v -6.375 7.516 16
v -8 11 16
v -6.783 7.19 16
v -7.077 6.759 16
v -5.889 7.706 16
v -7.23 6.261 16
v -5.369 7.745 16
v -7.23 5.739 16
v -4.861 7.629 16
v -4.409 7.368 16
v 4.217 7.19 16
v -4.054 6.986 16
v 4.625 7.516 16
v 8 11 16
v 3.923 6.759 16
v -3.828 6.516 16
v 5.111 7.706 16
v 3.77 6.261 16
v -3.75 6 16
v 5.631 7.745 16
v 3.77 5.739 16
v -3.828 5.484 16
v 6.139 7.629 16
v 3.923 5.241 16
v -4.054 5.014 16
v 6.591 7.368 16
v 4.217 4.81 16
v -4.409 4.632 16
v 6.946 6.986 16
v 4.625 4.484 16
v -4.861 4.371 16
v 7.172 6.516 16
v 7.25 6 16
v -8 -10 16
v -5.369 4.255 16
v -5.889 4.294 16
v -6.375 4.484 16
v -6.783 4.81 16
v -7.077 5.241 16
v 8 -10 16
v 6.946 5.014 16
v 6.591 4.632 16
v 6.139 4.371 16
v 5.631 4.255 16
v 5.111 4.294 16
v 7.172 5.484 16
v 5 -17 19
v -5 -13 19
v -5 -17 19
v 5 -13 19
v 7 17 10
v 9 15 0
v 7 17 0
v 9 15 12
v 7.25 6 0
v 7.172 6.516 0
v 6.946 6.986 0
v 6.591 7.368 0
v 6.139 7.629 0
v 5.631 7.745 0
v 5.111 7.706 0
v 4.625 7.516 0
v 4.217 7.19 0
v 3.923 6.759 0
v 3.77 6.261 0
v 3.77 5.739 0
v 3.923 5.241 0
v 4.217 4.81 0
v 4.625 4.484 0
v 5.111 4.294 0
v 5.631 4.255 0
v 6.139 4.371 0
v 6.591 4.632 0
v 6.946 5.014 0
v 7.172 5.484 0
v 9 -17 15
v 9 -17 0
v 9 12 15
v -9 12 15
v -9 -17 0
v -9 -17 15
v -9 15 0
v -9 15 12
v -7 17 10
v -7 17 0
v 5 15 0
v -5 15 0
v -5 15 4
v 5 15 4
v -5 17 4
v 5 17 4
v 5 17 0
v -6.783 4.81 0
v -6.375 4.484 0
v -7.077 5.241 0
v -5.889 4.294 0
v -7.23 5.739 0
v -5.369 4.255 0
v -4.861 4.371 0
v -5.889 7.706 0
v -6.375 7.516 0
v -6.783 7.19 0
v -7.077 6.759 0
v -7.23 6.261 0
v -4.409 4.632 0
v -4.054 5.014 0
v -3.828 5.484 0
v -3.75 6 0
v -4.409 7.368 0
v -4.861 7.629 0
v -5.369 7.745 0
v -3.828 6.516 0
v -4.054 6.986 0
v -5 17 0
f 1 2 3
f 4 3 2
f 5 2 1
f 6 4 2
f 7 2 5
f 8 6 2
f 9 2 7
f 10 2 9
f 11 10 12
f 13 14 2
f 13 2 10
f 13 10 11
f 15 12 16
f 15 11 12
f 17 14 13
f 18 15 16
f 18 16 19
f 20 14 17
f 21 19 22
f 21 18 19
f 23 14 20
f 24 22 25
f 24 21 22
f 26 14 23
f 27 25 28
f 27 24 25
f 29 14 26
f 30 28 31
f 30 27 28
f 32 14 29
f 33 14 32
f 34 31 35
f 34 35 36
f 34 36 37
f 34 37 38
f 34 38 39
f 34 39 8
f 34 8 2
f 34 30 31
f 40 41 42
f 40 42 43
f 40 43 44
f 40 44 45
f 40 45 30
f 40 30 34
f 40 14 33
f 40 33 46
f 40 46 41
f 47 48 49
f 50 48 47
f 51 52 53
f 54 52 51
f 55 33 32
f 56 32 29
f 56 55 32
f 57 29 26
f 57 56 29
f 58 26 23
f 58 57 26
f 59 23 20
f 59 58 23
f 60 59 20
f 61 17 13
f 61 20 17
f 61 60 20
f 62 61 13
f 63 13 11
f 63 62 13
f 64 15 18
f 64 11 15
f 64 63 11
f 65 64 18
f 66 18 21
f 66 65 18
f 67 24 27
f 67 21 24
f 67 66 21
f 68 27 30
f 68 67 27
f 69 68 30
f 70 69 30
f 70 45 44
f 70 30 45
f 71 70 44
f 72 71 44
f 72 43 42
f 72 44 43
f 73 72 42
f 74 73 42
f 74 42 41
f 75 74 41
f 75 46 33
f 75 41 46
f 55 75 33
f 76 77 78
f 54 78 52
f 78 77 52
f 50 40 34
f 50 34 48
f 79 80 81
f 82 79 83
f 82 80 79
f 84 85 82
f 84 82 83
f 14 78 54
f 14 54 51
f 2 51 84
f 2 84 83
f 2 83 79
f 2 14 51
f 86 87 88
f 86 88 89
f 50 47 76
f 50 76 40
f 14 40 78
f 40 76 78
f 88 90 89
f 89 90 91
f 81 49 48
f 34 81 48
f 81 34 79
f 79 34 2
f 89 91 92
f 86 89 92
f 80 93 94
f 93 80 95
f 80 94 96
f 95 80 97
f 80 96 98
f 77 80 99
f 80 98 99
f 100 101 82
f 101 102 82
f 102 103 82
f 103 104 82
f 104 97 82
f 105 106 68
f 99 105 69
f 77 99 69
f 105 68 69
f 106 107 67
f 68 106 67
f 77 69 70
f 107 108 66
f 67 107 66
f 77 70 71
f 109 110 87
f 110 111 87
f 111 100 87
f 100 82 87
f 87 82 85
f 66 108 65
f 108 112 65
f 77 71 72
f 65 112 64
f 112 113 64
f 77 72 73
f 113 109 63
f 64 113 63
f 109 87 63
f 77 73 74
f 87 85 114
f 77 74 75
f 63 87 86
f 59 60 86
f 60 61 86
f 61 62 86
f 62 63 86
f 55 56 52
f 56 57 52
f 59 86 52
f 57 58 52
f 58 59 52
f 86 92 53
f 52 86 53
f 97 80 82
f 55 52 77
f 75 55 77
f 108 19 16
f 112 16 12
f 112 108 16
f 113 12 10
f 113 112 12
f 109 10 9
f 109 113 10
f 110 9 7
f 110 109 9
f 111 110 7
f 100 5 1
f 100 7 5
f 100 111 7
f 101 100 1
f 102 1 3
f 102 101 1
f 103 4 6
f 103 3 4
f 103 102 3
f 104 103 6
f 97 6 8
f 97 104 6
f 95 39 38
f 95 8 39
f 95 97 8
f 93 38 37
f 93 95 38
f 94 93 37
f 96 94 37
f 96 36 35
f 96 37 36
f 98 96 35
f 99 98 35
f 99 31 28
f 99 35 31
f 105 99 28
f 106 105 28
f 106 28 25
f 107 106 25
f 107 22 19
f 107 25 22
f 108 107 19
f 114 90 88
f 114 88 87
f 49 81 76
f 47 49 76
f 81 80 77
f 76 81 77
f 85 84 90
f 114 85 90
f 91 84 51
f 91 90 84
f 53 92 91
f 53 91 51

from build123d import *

# Parameters (mm, degrees)
SKETCH1_W           = 18
SKETCH1_H           = 34
SKETCH1_R           = 1.75
BOSS_EXTRUDE1_DEPTH = 19
CUT_EXTRUDE1_DEPTH  = 18
CHAMFER1_SIZE       = 6
CHAMFER2_SIZE       = 2
CHAMFER3_SIZE       = 4
SKETCH3_W           = 10
SKETCH3_H           = 4
CUT_EXTRUDE2_DEPTH  = 2


with BuildPart() as part:
    # Sketch1 → Boss-Extrude1 (new body)
    with BuildSketch(Plane.XY):
        Rectangle(SKETCH1_W, SKETCH1_H)
        with Locations((5.5, 6)):
            Circle(SKETCH1_R, mode=Mode.SUBTRACT)
        with Locations((-5.5, 6)):
            Circle(SKETCH1_R, mode=Mode.SUBTRACT)
    extrude(amount=BOSS_EXTRUDE1_DEPTH)

    # Sketch2 → Cut-Extrude1 (cut)
    with BuildSketch(Plane(origin=(9, 0, 0), x_dir=(0, 0, -1), z_dir=(1, 0, 0))):
        Polygon((-19, 17), (-16, 17), (-16, -10), (-19, -13), align=None)
    extrude(amount=-CUT_EXTRUDE1_DEPTH, mode=Mode.SUBTRACT)

    # Chamfer1
    chamfer1_edges = [part.edges().sort_by_distance(p)[0] for p in [
        (0, 17, 16),
    ]]
    chamfer(chamfer1_edges, length=CHAMFER1_SIZE)

    # Chamfer2
    chamfer2_edges = [part.edges().sort_by_distance(p)[0] for p in [
        (-9, 17, 5),
        (9, 17, 5),
    ]]
    chamfer(chamfer2_edges, length=CHAMFER2_SIZE)

    # Chamfer3
    chamfer3_edges = [part.edges().sort_by_distance(p)[0] for p in [
        (-9, -15, 19),
        (9, -15, 19),
    ]]
    chamfer(chamfer3_edges, length=CHAMFER3_SIZE)

    # Sketch3 → Cut-Extrude2 (cut)
    with BuildSketch(Plane(origin=(0, 17, 0), x_dir=(1, 0, 0), z_dir=(0, 1, 0))):
        with Locations((0, -2)):
            Rectangle(SKETCH3_W, SKETCH3_H)
    extrude(amount=-CUT_EXTRUDE2_DEPTH, mode=Mode.SUBTRACT)


solid = part.part
